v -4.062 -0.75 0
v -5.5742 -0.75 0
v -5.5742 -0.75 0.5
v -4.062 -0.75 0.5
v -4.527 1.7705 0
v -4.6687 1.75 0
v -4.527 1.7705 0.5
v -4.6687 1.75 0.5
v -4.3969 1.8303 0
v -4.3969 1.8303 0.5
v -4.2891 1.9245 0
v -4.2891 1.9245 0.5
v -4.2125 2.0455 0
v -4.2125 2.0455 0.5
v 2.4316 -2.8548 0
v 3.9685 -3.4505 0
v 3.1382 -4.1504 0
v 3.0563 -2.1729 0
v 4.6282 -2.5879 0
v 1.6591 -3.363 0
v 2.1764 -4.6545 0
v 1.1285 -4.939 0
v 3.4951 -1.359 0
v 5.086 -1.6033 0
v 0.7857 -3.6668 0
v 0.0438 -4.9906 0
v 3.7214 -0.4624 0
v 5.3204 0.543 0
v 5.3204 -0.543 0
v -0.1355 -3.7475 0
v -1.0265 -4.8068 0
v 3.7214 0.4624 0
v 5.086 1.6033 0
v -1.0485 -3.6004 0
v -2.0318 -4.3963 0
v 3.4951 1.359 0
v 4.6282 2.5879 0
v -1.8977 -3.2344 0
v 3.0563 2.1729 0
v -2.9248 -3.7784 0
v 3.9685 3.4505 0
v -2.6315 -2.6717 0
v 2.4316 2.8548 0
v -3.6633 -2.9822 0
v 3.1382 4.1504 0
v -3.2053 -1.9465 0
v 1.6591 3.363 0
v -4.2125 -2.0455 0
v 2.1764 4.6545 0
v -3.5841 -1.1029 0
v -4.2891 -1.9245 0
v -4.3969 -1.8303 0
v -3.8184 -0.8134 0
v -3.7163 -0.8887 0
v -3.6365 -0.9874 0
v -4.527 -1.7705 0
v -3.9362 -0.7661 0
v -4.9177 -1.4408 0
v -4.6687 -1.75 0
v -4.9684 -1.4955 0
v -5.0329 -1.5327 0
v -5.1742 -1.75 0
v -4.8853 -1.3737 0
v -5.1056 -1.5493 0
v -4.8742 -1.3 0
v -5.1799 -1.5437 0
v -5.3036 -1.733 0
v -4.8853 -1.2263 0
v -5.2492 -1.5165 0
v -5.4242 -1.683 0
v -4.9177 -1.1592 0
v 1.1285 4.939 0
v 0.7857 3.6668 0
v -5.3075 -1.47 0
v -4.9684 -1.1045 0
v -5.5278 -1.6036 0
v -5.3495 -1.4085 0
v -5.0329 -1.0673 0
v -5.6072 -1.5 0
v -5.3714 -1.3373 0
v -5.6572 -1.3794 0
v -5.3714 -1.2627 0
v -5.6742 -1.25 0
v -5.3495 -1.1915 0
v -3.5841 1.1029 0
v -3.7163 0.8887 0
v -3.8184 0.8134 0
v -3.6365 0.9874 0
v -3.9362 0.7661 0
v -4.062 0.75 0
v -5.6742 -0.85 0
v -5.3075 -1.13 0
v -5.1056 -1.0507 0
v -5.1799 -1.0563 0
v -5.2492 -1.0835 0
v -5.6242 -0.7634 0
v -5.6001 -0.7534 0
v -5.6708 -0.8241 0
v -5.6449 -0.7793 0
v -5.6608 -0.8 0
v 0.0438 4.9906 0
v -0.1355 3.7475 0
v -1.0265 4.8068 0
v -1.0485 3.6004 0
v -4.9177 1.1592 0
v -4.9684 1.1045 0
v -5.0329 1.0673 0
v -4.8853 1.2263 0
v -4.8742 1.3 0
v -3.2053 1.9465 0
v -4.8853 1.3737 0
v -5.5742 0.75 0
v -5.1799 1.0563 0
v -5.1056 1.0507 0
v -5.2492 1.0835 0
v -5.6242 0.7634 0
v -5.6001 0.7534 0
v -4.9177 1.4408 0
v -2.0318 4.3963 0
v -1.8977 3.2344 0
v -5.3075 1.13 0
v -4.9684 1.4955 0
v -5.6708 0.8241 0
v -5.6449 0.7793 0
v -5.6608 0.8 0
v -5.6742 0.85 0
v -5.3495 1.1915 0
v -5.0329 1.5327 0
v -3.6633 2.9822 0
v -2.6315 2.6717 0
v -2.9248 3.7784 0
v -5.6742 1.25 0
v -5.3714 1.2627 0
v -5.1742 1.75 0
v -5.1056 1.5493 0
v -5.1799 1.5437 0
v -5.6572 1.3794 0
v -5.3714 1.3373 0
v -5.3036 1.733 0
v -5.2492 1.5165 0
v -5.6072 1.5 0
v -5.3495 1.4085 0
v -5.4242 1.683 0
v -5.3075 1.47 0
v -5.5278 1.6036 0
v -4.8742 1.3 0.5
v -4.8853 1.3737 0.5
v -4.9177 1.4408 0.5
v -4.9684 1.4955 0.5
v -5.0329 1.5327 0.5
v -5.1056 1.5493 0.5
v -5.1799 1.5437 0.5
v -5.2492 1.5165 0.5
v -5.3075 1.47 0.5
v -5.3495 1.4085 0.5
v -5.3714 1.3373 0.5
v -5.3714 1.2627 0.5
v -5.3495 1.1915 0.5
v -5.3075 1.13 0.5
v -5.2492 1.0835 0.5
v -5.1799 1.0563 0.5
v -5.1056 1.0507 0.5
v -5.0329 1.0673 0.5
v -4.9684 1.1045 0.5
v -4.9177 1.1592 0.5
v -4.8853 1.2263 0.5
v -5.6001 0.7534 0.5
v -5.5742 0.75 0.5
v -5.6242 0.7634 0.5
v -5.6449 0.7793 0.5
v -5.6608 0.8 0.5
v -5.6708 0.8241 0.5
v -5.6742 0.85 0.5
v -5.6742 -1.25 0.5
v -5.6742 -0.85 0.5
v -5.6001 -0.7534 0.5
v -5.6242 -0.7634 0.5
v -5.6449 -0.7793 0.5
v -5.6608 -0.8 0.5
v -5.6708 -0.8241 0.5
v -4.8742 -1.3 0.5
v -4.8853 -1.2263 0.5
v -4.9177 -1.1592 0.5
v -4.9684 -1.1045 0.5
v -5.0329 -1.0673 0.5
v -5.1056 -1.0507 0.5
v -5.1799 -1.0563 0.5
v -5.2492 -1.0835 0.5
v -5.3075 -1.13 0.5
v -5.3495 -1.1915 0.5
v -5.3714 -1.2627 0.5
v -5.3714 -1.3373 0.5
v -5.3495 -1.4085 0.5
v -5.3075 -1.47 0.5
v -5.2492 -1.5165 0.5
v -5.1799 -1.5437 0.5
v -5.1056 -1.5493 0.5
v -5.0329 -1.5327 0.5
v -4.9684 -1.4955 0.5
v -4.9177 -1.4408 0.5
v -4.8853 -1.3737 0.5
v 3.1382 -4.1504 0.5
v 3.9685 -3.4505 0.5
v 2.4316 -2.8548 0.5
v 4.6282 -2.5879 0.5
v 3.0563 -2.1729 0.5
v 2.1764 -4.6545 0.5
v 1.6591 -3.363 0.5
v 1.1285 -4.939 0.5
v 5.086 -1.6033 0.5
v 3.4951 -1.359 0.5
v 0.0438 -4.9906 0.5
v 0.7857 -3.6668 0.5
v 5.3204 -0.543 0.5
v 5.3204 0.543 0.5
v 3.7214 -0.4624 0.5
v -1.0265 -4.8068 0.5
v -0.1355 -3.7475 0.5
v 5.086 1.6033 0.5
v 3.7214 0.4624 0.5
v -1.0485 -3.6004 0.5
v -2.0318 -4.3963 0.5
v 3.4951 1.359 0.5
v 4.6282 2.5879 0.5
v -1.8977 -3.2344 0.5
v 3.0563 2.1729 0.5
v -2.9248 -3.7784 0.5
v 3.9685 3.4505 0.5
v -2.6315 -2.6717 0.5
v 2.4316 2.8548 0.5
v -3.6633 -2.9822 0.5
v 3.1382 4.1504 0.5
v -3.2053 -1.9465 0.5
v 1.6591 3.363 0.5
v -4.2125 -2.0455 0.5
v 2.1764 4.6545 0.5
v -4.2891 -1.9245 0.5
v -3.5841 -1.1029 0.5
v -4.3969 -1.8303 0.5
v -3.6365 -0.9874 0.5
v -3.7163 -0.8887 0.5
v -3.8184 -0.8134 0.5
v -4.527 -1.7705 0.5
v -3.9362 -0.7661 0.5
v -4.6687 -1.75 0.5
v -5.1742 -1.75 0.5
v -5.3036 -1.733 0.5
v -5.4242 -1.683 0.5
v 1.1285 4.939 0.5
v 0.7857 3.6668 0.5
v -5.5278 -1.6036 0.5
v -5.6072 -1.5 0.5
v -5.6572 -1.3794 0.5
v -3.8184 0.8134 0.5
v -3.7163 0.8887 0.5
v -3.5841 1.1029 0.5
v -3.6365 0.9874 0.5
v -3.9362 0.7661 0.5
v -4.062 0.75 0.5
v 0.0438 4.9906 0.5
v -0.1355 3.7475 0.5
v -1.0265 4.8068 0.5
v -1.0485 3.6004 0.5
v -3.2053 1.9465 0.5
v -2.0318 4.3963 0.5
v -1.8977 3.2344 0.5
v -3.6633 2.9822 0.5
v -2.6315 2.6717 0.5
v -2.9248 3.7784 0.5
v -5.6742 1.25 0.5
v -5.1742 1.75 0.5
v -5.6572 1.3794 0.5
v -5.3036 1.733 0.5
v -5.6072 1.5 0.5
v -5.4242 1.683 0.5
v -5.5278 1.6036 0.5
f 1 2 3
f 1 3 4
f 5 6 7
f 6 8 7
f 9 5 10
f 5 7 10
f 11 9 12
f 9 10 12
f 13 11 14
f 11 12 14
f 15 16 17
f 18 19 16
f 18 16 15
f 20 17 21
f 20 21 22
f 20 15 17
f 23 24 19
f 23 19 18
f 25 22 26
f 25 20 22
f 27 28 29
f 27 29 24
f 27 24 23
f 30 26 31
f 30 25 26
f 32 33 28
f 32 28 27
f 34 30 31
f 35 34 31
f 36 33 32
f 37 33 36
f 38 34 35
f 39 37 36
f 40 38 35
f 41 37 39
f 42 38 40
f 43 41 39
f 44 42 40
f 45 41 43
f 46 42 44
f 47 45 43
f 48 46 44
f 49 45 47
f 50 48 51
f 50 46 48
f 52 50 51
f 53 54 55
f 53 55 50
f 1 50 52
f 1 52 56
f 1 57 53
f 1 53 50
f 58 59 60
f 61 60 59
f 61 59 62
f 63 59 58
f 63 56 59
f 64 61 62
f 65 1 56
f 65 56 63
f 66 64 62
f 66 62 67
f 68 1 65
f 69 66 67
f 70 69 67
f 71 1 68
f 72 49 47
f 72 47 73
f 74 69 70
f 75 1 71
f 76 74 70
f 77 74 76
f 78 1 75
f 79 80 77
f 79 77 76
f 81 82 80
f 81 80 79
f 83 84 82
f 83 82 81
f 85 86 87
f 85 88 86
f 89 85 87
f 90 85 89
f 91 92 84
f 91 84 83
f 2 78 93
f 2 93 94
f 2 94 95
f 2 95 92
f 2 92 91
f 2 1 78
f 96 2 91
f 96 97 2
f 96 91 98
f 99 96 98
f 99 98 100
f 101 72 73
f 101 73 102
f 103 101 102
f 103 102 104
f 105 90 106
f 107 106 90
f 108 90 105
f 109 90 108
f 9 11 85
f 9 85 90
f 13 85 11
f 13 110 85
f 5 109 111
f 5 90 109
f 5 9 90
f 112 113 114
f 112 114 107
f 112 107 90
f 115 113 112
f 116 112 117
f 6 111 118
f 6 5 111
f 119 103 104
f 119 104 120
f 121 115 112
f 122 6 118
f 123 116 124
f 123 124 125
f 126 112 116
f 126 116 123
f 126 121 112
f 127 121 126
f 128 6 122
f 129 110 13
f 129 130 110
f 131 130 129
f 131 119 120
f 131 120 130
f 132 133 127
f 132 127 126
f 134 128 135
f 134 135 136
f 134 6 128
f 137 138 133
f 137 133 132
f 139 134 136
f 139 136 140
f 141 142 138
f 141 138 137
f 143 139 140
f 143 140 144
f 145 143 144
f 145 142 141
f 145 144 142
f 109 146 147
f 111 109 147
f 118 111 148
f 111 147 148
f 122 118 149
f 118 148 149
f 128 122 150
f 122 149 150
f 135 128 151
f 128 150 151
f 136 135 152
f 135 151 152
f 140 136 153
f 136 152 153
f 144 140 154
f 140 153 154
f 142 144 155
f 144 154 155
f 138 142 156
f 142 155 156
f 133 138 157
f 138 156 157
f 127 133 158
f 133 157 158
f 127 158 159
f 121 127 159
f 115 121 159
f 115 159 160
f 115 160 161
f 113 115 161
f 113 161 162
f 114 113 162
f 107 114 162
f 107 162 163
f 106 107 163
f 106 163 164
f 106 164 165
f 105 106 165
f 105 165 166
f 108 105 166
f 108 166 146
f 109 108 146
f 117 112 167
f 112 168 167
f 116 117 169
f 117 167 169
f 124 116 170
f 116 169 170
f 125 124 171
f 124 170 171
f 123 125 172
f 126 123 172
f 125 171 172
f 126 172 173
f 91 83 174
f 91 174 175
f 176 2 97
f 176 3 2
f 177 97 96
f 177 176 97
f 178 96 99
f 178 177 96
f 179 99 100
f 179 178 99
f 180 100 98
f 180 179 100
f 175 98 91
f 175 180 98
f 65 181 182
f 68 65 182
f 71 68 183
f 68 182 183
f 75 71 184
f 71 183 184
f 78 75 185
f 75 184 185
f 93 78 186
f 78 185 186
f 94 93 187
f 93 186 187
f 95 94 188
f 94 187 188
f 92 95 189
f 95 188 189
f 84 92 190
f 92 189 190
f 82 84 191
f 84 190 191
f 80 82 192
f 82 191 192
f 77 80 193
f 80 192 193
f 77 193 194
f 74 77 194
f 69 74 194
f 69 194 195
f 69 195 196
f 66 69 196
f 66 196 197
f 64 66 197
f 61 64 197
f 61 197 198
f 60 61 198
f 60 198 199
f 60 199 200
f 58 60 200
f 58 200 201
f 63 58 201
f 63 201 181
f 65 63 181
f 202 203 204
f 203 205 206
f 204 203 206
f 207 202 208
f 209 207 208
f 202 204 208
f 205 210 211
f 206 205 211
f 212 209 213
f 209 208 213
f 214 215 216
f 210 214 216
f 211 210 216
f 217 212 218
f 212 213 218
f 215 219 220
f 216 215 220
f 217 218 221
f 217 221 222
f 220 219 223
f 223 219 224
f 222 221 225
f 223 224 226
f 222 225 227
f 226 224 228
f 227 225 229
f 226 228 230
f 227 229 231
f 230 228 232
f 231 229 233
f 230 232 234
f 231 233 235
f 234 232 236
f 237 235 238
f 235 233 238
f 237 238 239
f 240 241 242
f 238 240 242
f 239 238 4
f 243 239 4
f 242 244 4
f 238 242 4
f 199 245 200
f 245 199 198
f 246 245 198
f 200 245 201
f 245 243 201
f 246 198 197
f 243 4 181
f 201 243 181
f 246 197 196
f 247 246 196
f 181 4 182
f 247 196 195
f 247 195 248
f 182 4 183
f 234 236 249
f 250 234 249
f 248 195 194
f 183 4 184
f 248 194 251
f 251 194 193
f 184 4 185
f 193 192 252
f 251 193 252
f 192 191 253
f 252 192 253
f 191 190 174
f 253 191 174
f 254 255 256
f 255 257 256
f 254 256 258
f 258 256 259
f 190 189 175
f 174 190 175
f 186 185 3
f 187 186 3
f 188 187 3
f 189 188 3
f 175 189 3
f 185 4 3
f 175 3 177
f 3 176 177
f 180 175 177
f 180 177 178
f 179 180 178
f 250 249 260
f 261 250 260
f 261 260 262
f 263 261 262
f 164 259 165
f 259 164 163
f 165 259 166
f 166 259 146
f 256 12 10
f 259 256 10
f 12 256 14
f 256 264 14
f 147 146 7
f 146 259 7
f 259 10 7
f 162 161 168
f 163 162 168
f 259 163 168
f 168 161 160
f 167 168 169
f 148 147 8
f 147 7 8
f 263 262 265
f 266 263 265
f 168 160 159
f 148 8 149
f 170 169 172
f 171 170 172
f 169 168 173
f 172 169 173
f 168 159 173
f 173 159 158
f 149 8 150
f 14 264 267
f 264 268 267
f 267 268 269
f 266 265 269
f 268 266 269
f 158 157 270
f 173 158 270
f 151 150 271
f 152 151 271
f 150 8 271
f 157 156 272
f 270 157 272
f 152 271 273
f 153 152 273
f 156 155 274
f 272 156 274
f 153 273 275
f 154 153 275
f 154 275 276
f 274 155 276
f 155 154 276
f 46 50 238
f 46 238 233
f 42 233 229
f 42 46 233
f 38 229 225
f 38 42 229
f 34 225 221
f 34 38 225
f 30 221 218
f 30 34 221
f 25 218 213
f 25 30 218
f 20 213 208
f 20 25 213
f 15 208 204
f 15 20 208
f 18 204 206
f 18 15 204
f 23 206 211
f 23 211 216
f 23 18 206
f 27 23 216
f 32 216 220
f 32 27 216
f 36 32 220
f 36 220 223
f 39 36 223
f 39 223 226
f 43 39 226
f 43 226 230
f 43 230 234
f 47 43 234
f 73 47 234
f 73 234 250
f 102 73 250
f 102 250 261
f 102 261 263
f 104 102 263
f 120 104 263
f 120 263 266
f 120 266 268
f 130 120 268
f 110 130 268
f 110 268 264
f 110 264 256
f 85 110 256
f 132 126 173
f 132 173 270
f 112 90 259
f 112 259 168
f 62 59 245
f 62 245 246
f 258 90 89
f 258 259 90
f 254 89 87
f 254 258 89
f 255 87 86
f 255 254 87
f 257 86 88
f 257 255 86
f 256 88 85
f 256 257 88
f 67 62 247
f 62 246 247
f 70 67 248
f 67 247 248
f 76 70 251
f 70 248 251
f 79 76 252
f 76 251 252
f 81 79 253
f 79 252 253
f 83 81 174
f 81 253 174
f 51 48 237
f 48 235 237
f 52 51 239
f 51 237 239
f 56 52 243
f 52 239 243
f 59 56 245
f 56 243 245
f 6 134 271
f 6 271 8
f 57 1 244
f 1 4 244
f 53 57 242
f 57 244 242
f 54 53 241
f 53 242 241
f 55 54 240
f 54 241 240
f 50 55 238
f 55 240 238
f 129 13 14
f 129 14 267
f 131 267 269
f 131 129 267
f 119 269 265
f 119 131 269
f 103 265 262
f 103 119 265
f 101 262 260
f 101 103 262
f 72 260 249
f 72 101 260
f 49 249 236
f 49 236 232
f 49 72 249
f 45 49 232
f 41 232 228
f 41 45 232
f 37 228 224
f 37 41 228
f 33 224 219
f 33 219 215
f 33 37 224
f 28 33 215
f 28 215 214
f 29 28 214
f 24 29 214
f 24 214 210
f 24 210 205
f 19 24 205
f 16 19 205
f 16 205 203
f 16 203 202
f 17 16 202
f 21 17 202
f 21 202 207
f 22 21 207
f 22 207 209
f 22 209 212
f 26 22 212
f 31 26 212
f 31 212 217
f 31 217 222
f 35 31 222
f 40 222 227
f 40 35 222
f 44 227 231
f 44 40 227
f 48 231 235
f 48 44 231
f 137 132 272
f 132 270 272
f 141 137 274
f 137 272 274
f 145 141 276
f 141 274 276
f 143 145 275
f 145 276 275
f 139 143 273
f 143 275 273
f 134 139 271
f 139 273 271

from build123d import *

# Parameters (mm, degrees)
BOSS_EXTRUDE1_DEPTH = 0.5
FILLET1_R           = 0.5
FILLET2_R           = 0.1
CUT_EXTRUDE1_REACH  = 9.579
SKETCH2_R           = 0.25


with BuildPart() as part:
    # Sketch1 → Boss-Extrude1 (new body)
    with BuildSketch(Plane.XY):
        with BuildLine():
            Line((-3.674234614, 0.75), (-5.674234614, 0.75))
            Line((-5.674234614, 0.75), (-5.674234614, 1.75))
            Line((-5.674234614, 1.75), (-4.333748499, 1.75))
            ThreePointArc((-4.333748499, 1.75), (5.35, 0), (-4.333748499, -1.75))
            Line((-4.333748499, -1.75), (-5.674234614, -1.75))
            Line((-5.674234614, -1.75), (-5.674234614, -0.75))
            Line((-5.674234614, -0.75), (-3.674234614, -0.75))
            ThreePointArc((-3.674234614, -0.75), (3.75, 0), (-3.674234614, 0.75))
        make_face()
    extrude(amount=BOSS_EXTRUDE1_DEPTH)

    # Fillet1
    fillet1_edges = [part.edges().sort_by_distance(p)[0] for p in [
        (-5.674234614, 1.75, 0.25),
        (-4.333748499, 1.75, 0.25),
        (-4.333748499, -1.75, 0.25),
        (-5.674234614, -1.75, 0.25),
        (-3.674234614, -0.75, 0.25),
        (-3.674234614, 0.75, 0.25),
    ]]
    fillet(fillet1_edges, radius=FILLET1_R)

    # Fillet2
    fillet2_edges = [part.edges().sort_by_distance(p)[0] for p in [
        (-5.674234614, -0.75, 0.25),
        (-5.674234614, 0.75, 0.25),
    ]]
    fillet(fillet2_edges, radius=FILLET2_R)

    # Sketch2 → Cut-Extrude1 (cut, up to next)
    with BuildSketch(Plane.XY.offset(0.5), mode=Mode.PRIVATE) as cut_extrude1_sk1:
        with Locations((-5.124234614, 1.3)):
            Circle(SKETCH2_R)
    cut_extrude1_tool1 = extrude(cut_extrude1_sk1.sketch, amount=-CUT_EXTRUDE1_REACH, mode=Mode.PRIVATE) & part.part
    # Sketch2 → Cut-Extrude1 (cut, up to next)
    with BuildSketch(Plane.XY.offset(0.5), mode=Mode.PRIVATE) as cut_extrude1_sk2:
        with Locations((-5.124234614, -1.3)):
            Circle(SKETCH2_R)
    cut_extrude1_tool2 = extrude(cut_extrude1_sk2.sketch, amount=-CUT_EXTRUDE1_REACH, mode=Mode.PRIVATE) & part.part
    add(cut_extrude1_tool1.solids().sort_by_distance((-5.124235, 1.3, 0.5))[0], mode=Mode.SUBTRACT)
    add(cut_extrude1_tool2.solids().sort_by_distance((-5.124235, -1.3, 0.5))[0], mode=Mode.SUBTRACT)


solid = part.part
